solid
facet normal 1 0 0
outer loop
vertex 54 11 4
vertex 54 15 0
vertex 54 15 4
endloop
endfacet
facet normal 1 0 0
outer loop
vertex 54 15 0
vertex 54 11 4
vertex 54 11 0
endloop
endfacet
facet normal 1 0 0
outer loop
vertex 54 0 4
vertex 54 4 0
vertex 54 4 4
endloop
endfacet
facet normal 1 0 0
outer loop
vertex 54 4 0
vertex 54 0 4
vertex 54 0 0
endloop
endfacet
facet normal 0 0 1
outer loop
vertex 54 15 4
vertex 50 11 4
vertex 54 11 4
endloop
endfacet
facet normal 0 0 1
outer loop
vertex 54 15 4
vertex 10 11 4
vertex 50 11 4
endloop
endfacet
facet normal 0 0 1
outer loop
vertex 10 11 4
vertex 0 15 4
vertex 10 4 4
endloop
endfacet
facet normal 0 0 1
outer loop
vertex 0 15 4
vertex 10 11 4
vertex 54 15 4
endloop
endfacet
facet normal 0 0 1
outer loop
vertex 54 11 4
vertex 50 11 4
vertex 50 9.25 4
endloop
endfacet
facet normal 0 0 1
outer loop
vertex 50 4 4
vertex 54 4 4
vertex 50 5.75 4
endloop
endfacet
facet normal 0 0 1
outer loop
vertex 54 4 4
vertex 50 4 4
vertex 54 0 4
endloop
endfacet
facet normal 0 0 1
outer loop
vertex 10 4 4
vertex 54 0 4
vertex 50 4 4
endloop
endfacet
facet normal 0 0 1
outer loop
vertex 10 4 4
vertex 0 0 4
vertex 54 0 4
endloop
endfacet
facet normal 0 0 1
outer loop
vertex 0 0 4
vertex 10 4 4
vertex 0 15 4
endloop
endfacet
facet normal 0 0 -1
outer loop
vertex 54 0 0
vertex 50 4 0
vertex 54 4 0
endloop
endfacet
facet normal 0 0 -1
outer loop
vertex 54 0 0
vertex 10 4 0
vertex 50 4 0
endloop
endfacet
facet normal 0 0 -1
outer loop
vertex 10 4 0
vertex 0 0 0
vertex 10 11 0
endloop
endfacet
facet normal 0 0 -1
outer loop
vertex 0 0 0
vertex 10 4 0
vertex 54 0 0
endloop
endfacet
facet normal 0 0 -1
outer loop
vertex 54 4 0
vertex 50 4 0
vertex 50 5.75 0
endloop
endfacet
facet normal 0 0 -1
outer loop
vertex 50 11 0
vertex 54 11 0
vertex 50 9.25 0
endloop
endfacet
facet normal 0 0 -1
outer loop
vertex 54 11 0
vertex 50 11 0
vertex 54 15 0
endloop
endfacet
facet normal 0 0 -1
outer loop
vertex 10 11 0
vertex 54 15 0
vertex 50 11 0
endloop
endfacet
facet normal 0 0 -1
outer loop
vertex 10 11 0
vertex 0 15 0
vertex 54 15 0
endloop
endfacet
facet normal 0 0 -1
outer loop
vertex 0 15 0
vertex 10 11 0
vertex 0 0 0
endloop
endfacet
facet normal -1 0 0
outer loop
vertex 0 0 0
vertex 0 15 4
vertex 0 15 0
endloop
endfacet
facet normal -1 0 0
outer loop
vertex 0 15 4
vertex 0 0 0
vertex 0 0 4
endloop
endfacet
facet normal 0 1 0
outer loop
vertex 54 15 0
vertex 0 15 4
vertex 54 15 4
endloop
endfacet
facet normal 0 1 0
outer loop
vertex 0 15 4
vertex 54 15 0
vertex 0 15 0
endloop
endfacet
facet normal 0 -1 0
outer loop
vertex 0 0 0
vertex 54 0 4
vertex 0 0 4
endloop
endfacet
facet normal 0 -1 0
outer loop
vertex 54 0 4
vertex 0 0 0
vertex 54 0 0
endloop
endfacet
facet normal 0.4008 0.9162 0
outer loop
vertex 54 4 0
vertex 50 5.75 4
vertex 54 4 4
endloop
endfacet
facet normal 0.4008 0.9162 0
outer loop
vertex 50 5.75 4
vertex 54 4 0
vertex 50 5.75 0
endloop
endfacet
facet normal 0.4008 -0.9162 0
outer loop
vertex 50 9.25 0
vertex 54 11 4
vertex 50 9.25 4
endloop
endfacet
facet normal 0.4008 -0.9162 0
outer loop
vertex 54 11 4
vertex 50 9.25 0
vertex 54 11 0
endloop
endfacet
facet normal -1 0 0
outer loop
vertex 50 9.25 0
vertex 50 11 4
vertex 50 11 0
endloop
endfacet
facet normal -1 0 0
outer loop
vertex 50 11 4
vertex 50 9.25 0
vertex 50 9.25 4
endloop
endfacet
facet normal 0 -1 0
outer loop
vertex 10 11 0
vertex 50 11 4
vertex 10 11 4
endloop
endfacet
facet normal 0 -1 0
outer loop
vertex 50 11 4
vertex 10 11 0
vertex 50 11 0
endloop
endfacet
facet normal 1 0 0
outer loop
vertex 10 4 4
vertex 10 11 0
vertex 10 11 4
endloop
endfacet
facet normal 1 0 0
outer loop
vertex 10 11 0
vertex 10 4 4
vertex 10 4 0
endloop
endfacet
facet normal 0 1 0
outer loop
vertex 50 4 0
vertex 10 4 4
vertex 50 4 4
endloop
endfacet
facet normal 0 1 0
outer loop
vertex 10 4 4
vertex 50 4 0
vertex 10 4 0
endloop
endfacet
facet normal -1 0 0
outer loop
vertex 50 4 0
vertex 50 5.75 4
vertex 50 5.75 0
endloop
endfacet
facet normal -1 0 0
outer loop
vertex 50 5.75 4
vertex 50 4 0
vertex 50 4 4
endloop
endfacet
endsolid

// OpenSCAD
module clippy( frm_ht, frm_thk, top_clr, arm_thk, clp_thk, clp_ht ){
    //assert: 0 < clp_gap < 1
    
    main = [
        top_clr + frm_ht  + clp_thk,
        arm_thk + frm_thk + arm_thk,
        clp_thk
    ];
    
    difference() {
        cube(main);
        translate([
            top_clr,
            arm_thk,
            0
        ]) linear_extrude( height = main[2] ) {
            polygon([
                [0,                 0               ],
                [frm_ht,            0               ],
                [frm_ht,            clp_ht          ],
                [frm_ht + clp_thk,  0               ],
                [frm_ht + clp_thk,  frm_thk         ],
                [frm_ht,            frm_thk - clp_ht],
                [frm_ht,            frm_thk         ],
                [0,                 frm_thk         ]
            ]);
        };
    };
};

frm_thk   = 7; 
frm_ht    = 40;

clippy( frm_ht, frm_thk, 10, 4, 4, 0.25 * frm_thk);
